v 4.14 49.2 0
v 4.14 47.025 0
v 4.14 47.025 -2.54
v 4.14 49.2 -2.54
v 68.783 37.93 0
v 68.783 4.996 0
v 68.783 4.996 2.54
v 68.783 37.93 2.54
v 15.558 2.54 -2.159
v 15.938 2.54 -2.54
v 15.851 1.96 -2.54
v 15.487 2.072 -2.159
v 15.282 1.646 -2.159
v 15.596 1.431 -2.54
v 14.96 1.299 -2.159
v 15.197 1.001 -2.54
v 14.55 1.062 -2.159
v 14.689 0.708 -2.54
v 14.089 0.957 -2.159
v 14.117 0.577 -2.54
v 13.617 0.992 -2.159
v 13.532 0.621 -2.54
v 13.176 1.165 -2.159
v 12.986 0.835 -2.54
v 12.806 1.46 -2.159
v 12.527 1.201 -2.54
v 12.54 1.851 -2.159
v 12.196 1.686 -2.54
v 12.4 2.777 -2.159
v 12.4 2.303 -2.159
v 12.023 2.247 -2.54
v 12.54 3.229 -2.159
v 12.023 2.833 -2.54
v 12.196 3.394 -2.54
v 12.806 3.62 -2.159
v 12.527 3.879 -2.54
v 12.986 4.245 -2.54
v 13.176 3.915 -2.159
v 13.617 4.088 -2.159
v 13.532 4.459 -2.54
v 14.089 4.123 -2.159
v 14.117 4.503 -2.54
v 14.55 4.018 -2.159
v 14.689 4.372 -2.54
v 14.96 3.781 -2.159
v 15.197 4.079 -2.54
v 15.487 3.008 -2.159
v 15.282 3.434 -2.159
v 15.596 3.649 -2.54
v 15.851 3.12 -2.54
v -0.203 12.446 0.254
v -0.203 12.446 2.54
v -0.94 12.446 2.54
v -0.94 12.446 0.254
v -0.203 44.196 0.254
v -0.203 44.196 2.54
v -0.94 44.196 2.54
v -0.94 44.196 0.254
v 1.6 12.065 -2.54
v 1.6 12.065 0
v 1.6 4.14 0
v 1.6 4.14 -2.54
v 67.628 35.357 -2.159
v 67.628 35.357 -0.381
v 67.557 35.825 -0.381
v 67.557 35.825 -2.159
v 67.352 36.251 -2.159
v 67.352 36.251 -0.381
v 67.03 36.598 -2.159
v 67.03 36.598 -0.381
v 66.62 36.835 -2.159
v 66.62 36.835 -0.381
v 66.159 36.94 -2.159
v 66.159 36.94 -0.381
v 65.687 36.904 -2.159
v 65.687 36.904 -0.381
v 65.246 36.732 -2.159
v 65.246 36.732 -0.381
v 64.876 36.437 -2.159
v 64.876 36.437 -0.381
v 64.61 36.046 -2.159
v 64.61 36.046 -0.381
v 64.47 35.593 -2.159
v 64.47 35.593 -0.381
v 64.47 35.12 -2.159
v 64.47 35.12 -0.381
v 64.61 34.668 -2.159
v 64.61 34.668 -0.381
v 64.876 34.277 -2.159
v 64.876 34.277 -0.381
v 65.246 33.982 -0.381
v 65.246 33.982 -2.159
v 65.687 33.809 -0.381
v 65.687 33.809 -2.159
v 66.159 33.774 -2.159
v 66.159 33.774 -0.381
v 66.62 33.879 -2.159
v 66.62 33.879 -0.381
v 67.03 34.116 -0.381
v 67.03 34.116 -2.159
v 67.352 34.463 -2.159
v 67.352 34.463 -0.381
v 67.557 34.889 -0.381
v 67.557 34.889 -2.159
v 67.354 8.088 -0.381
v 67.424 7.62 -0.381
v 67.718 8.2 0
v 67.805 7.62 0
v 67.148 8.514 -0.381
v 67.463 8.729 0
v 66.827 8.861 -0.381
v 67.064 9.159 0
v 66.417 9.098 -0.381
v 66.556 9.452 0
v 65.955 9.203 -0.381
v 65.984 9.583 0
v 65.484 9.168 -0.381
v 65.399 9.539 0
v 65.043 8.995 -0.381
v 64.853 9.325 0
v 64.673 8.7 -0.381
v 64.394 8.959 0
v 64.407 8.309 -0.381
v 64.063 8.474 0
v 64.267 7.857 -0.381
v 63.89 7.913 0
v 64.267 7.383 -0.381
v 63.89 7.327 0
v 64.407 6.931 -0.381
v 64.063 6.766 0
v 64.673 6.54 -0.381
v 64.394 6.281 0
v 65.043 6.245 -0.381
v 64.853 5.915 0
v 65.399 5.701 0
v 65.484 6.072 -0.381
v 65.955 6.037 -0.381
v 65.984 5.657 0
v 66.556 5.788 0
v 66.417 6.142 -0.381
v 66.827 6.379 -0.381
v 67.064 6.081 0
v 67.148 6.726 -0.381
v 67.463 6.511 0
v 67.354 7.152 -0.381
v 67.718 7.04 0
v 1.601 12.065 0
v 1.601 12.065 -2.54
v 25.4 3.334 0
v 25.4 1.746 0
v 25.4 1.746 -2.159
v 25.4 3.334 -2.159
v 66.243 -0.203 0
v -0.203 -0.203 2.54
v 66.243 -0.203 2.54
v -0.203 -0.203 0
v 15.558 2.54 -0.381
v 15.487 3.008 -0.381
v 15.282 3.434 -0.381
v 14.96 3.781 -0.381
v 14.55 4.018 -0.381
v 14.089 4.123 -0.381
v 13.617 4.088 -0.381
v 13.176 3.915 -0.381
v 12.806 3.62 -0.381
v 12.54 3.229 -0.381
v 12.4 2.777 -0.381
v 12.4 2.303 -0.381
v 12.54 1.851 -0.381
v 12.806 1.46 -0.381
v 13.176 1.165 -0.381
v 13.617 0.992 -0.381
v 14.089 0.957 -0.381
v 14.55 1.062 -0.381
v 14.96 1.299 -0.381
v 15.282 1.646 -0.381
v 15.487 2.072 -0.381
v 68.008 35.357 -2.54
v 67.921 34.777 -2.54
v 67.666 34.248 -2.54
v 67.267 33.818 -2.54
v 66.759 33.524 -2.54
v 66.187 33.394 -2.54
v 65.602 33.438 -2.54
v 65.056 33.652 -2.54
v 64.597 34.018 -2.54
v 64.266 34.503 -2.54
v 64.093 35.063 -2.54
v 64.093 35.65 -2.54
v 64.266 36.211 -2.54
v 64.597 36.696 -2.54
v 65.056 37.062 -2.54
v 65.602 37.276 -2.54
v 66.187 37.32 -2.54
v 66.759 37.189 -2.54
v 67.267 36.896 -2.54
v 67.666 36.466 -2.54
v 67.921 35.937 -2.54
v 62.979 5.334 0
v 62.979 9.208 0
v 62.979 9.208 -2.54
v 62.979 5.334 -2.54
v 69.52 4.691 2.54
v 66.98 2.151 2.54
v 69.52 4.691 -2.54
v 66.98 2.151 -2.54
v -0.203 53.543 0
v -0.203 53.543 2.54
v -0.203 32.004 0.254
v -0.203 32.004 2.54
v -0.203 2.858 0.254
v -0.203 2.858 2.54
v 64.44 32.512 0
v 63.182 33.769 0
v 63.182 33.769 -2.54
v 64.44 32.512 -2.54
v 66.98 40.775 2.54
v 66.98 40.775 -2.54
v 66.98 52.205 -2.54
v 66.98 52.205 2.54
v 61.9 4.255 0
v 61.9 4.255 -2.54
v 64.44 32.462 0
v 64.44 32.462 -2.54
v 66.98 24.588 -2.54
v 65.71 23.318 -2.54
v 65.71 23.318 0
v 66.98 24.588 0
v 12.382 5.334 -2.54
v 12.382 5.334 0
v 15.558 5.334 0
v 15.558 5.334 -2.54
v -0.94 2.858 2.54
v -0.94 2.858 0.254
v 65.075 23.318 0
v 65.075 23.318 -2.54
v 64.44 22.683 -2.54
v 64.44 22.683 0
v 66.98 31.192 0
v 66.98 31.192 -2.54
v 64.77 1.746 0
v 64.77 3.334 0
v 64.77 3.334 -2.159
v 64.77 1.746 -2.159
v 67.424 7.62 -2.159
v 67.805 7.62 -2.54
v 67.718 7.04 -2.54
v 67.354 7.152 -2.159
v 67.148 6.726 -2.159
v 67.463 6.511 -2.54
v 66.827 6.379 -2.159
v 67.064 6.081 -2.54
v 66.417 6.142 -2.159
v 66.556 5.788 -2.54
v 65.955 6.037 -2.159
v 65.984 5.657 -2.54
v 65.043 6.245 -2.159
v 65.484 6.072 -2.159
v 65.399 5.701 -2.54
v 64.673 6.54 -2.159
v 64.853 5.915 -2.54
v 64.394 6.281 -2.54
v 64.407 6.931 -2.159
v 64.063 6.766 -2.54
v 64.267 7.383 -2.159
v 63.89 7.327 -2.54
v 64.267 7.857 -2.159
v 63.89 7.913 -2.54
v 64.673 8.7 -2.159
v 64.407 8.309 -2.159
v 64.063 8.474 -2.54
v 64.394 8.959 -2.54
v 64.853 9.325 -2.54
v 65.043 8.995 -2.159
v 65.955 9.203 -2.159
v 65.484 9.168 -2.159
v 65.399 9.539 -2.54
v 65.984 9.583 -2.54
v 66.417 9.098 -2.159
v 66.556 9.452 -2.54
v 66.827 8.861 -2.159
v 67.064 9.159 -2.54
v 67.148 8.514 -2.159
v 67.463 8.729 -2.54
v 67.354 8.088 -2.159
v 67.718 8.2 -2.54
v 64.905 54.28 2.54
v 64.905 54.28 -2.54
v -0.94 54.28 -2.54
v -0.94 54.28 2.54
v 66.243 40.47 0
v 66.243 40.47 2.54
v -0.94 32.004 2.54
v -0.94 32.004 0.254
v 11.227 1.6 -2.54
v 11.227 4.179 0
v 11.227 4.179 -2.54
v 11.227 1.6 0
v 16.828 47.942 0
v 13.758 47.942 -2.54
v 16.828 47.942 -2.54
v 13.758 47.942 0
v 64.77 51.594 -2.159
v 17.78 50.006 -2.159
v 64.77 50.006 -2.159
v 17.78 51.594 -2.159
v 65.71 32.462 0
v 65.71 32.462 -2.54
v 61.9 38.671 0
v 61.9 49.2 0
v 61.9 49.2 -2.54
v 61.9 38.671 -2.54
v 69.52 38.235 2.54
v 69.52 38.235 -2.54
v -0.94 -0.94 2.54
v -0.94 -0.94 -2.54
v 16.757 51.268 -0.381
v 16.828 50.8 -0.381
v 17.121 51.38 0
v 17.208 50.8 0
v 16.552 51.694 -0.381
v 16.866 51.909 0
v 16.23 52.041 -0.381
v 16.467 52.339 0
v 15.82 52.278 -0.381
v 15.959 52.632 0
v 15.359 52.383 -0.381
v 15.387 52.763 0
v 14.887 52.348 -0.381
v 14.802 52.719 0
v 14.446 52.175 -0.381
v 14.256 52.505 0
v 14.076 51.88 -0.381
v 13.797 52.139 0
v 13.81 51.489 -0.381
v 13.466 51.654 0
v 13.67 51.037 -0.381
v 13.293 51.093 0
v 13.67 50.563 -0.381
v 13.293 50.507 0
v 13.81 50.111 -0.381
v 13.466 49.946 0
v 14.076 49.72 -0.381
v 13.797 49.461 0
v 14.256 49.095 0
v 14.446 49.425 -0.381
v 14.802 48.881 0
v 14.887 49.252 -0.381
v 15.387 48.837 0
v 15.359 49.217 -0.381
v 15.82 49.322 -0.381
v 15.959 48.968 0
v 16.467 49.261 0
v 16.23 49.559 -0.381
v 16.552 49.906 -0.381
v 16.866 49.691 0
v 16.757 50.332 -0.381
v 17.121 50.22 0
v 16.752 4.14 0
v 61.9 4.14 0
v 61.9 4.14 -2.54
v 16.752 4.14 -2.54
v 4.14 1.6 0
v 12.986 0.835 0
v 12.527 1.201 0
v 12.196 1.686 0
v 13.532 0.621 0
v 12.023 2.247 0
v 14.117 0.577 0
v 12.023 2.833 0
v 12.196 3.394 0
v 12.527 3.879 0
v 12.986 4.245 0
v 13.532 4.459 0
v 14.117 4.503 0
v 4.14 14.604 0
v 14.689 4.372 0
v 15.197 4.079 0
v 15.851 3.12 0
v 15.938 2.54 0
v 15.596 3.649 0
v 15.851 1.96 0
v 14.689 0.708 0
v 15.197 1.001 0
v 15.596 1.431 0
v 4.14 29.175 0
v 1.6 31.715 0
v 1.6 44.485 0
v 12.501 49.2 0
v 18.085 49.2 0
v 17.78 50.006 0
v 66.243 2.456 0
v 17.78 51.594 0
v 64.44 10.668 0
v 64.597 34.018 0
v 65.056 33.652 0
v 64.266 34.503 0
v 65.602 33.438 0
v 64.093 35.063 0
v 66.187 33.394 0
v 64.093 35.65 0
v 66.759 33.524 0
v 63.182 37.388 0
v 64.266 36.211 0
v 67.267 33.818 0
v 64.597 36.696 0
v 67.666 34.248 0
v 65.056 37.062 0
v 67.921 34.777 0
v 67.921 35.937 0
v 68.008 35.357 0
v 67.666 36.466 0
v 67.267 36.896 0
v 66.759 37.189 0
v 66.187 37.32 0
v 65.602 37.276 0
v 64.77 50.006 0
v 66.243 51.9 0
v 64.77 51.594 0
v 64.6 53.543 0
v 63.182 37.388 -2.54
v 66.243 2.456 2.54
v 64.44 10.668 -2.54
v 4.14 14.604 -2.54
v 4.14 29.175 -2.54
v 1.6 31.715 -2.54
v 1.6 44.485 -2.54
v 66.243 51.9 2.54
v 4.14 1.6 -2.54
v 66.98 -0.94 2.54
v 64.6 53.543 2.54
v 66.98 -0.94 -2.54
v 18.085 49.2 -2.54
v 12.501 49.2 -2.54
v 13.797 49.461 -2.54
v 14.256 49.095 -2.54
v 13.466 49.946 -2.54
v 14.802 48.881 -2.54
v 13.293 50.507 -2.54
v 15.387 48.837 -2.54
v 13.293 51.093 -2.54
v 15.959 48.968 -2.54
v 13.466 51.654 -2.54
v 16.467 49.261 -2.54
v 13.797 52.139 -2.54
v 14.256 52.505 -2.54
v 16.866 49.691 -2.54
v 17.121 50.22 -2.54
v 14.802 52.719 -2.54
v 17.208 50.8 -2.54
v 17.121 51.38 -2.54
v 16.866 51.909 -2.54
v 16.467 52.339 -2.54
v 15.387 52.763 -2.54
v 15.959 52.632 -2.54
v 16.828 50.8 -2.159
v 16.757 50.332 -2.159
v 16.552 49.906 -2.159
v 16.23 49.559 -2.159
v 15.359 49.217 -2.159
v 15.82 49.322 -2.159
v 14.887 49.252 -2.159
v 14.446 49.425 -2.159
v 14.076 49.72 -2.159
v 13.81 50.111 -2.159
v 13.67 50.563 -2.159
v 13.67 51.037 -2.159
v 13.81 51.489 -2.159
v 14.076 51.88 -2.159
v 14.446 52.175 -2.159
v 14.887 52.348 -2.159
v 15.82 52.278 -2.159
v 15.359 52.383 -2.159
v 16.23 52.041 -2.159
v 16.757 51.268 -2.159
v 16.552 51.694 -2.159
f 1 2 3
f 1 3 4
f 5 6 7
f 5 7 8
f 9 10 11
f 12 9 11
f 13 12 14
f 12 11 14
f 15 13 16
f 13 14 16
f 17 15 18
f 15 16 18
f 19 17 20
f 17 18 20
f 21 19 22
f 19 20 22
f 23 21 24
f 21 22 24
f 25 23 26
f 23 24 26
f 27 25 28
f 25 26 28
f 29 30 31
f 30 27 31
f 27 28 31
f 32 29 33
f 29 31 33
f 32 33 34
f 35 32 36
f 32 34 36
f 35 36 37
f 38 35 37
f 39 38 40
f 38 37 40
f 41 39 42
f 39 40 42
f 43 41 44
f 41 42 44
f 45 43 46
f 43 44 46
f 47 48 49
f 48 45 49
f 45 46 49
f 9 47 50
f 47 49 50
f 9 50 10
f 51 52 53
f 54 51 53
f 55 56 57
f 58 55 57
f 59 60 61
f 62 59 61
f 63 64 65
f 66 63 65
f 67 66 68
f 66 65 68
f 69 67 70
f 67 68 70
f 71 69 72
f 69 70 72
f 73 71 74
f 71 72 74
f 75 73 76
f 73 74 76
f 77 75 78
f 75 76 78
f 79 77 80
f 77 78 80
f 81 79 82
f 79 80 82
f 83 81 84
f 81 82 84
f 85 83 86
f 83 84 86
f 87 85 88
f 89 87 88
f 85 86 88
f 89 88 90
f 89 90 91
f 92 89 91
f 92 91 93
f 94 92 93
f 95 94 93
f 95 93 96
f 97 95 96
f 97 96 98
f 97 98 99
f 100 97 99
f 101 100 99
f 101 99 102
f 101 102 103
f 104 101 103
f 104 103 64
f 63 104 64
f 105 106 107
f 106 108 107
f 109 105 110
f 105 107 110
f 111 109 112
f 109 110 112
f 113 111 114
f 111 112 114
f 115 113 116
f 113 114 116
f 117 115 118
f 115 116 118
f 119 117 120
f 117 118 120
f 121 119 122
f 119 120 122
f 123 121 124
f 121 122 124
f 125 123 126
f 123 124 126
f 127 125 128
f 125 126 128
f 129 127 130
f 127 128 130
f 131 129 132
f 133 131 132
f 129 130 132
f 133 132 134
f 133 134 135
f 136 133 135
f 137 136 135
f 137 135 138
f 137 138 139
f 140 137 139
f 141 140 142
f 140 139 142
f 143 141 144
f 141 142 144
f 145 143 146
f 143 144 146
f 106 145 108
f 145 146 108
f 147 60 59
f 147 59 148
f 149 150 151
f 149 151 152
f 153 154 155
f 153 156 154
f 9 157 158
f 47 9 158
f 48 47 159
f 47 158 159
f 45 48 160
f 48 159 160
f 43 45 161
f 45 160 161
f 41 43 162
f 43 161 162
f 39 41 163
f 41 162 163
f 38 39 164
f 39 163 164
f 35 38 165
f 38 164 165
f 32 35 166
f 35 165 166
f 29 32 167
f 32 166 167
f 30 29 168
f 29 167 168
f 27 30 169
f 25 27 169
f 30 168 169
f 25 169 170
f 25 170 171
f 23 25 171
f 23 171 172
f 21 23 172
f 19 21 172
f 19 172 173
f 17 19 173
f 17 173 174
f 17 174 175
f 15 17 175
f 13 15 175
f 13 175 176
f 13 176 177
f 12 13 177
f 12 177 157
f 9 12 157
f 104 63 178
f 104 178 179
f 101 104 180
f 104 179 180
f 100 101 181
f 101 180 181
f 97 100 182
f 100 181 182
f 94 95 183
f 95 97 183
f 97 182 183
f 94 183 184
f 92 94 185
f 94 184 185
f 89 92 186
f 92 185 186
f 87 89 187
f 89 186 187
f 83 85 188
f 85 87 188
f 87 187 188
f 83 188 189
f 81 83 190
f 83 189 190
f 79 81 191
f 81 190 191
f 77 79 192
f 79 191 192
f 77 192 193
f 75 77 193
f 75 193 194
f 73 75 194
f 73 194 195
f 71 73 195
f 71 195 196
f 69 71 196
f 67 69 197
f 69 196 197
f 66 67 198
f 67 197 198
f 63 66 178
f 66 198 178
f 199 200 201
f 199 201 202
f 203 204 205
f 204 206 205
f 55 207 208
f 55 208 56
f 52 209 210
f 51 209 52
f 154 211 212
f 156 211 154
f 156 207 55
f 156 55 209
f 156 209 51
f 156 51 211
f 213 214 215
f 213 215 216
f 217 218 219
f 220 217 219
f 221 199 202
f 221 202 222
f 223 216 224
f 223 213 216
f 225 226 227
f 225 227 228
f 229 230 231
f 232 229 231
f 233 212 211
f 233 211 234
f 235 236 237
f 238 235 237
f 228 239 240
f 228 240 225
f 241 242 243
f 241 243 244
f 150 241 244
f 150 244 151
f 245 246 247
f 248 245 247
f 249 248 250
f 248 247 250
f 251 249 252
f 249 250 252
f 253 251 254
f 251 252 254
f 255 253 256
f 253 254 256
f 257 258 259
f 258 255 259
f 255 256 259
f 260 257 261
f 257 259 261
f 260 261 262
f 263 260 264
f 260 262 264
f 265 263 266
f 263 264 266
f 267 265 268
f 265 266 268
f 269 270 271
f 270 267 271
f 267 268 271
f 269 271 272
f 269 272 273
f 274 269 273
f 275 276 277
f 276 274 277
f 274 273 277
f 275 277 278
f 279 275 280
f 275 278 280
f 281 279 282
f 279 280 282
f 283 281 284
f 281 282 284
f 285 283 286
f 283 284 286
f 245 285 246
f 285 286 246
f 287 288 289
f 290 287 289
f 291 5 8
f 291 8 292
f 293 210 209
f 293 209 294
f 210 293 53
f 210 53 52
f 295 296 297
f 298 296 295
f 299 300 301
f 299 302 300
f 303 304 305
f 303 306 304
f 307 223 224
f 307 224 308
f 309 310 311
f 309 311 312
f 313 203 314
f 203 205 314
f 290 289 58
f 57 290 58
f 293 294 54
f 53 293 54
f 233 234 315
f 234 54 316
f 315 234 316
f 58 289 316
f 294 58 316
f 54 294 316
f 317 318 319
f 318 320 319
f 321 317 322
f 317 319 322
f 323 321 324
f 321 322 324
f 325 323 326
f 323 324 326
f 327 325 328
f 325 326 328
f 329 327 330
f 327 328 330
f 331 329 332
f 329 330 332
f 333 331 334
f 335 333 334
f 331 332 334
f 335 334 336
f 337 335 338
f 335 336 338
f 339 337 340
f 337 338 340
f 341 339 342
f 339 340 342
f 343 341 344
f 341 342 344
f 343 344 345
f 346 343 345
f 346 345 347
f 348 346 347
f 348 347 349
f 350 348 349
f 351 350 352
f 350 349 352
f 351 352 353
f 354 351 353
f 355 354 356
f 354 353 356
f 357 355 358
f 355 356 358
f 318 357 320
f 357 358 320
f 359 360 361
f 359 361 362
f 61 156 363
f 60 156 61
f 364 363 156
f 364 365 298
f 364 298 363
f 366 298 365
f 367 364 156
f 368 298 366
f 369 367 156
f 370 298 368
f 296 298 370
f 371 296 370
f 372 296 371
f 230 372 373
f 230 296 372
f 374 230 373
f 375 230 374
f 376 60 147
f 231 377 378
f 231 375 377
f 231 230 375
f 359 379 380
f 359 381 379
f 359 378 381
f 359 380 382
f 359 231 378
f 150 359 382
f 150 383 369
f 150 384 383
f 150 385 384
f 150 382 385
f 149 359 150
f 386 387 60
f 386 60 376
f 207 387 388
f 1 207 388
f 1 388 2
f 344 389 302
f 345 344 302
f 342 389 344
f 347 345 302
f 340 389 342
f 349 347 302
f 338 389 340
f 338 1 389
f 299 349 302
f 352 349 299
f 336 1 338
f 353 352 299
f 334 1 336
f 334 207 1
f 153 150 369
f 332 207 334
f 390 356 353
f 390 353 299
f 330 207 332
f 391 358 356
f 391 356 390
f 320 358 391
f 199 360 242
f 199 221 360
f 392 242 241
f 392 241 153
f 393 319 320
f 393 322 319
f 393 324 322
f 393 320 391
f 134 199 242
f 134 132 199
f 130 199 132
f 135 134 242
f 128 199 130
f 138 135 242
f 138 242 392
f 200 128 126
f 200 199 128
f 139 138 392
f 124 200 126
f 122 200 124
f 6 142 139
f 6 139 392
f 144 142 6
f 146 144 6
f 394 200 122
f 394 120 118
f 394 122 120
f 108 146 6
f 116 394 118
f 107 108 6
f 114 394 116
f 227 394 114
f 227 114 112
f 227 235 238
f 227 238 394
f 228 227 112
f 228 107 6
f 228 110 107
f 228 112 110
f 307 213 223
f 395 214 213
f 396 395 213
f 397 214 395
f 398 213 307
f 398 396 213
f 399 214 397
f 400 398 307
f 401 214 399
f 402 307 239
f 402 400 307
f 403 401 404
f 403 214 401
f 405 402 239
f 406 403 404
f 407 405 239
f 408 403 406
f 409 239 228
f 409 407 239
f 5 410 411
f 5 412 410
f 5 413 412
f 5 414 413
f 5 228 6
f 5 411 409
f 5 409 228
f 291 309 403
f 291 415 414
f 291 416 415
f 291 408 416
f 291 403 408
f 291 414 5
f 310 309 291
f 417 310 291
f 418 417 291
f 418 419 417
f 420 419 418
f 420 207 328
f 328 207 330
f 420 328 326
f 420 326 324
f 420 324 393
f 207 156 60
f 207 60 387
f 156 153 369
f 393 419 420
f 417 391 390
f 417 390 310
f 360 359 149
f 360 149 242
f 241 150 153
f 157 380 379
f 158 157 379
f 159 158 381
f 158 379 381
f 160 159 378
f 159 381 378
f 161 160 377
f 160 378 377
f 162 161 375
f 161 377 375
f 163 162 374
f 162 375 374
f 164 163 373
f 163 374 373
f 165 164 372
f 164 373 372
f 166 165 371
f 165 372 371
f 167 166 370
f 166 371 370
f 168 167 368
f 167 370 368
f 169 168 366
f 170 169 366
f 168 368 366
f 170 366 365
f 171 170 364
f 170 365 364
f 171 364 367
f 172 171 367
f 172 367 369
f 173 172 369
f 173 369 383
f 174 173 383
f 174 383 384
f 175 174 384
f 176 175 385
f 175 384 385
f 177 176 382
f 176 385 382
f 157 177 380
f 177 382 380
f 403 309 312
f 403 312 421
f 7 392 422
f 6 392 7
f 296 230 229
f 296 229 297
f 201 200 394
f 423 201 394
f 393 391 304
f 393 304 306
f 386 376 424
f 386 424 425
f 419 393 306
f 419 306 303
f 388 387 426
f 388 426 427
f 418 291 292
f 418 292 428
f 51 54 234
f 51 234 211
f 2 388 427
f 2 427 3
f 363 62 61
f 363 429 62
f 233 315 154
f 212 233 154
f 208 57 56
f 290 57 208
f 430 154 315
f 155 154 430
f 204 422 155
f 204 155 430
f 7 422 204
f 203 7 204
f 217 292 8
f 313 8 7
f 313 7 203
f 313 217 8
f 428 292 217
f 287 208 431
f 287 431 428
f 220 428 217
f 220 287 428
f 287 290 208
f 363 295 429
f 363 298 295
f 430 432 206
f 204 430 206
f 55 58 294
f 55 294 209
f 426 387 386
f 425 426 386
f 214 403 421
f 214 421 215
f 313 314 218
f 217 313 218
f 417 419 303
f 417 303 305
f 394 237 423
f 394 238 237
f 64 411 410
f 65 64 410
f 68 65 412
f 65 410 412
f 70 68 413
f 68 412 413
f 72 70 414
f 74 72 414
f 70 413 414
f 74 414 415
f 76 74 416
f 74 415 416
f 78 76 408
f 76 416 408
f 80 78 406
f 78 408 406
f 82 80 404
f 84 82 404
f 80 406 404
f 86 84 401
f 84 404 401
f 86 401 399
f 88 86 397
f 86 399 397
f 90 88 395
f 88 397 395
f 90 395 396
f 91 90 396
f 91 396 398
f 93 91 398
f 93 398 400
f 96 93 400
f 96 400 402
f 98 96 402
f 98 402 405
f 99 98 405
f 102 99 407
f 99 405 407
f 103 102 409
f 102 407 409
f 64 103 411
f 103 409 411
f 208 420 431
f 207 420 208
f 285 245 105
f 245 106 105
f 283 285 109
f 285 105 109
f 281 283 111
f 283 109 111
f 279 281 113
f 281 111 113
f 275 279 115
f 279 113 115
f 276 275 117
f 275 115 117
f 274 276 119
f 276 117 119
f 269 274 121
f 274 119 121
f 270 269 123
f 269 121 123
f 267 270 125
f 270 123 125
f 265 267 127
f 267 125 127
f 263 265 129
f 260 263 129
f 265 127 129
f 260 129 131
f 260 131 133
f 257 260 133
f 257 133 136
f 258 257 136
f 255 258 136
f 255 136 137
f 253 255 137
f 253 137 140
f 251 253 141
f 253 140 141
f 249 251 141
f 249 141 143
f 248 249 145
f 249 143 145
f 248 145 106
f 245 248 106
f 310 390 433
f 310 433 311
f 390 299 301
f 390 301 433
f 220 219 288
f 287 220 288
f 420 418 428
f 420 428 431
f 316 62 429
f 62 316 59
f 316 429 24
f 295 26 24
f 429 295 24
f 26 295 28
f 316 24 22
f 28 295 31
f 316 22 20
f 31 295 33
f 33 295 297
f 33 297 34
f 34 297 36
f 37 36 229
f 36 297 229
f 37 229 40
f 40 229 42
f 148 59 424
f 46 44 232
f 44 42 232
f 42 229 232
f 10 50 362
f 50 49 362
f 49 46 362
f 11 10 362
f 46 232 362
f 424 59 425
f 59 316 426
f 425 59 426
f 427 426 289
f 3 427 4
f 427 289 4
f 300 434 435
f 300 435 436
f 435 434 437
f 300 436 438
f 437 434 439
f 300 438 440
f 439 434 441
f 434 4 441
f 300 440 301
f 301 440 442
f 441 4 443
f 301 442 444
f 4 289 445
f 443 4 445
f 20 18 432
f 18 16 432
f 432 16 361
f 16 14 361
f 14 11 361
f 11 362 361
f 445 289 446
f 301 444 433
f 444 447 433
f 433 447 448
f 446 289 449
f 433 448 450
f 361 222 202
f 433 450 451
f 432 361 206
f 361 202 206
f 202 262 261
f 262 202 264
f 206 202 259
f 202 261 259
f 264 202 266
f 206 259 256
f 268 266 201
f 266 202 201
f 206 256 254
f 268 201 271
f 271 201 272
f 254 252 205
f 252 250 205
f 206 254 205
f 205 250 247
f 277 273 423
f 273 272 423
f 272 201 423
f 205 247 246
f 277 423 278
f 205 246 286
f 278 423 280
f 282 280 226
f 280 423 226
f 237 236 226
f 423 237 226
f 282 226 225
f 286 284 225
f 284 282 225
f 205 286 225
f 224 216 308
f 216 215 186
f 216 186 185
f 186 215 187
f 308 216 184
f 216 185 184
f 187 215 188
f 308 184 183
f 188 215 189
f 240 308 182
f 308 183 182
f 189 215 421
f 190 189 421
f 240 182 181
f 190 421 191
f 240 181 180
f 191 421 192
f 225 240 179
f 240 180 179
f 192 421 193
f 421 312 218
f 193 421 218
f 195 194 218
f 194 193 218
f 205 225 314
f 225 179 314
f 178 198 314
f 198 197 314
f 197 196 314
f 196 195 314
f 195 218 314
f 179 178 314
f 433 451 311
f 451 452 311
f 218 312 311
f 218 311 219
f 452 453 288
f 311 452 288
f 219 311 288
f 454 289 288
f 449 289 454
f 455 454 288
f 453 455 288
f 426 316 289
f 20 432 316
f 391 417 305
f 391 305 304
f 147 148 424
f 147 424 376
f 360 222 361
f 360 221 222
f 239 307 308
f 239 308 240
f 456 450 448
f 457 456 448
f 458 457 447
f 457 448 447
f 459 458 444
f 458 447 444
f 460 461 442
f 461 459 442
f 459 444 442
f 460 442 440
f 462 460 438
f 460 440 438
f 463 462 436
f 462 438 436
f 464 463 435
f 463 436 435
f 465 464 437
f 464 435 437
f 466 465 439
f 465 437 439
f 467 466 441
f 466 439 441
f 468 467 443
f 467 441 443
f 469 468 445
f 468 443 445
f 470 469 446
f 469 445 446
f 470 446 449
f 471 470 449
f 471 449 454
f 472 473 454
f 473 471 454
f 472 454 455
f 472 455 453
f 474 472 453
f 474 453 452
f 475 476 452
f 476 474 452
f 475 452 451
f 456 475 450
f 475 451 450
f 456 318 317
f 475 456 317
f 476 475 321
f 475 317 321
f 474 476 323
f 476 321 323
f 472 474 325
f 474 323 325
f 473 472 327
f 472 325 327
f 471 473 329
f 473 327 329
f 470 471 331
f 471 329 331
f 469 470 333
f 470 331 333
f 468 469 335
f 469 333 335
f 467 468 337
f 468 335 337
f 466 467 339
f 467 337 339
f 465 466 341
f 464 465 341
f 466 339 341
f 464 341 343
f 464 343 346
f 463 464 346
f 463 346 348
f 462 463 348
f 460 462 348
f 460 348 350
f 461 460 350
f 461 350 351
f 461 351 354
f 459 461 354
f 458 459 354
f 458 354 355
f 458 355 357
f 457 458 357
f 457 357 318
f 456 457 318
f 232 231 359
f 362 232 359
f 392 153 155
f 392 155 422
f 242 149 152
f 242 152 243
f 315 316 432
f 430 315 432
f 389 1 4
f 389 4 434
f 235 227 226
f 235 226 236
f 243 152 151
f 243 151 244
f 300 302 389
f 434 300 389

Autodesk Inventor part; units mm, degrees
ref_plane "YZ Plane" through (0, 0, 0) normal (1, 0, 0) x (0, 1, 0)
ref_plane "XZ Plane" through (0, 0, 0) normal (0, 1, 0) x (-1, 0, 0)
ref_plane "XY Plane" through (0, 0, 0) normal (0, 0, 1) x (1, 0, 0)
sketch "Sketch1" plane through (0, 0, 0) normal (0, 0, 1) x (1, 0, 0)
  line L0 (0, 53.34) -> (64.516, 53.34)
  line L1 (64.516, 53.34) -> (66.04, 51.816)
  line L2 (66.04, 51.816) -> (66.04, 40.386)
  line L3 (66.04, 40.386) -> (68.58, 37.846)
  line L4 (68.58, 37.846) -> (68.58, 5.08)
  line L5 (66.04, 0) -> (0, 0)
  line L6 (0, 0) -> (0, 53.34)
  line L7 (68.58, 5.08) -> (66.04, 2.54)
  line L8 (66.04, 2.54) -> (66.04, 0)
  line L9 (64.9053, 54.2798) -> (-0.9398, 54.2798)
  line L10 (-0.9398, 54.2798) -> (-0.9398, -0.9398)
  line L11 (-0.9398, -0.9398) -> (66.9798, -0.9398)
  line L12 (66.9798, -0.9398) -> (66.9798, 2.1507)
  line L13 (66.9798, 2.1507) -> (69.5198, 4.6907)
  line L14 (69.5198, 4.6907) -> (69.5198, 38.2353)
  line L15 (69.5198, 38.2353) -> (66.9798, 40.7753)
  line L16 (66.9798, 40.7753) -> (66.9798, 52.2053)
  line L17 (66.9798, 52.2053) -> (64.9053, 54.2798)
  line L18 (64.6002, 53.5432) -> (-0.2032, 53.5432)
  line L19 (-0.2032, 53.5432) -> (-0.2032, -0.2032)
  line L20 (-0.2032, -0.2032) -> (66.2432, -0.2032)
  line L21 (66.2432, -0.2032) -> (66.2432, 2.4558)
  line L22 (66.2432, 2.4558) -> (68.7832, 4.9958)
  line L23 (68.7832, 4.9958) -> (68.7832, 37.9302)
  line L24 (68.7832, 37.9302) -> (66.2432, 40.4702)
  line L25 (66.2432, 40.4702) -> (66.2432, 51.9002)
  line L26 (66.2432, 51.9002) -> (64.6002, 53.5432)
  point P0 (0, 0)
  dimension "d0" = 64.516
  dimension "d1" = 53.34
  dimension "d4" = 66.04
  dimension "d5" = 51.816
  dimension "d6" = 68.58
  dimension "d7" = 40.386
  dimension "d8" = 37.846
  dimension "d9" = 66.04
  dimension "d10" = 2.54
  dimension "d11" = 5.08
  dimension "d15" = 0.2032
  dimension "d18" = 0.7366
extrude "Extrusion2" add sketch "Sketch1" along normal blind 2.54 contours L17 L16 L15 L14 L13 L12 L11 L10 L9
sketch "Sketch2" plane through (0, 0, 0) normal (0, 0, 1) x (1, 0, 0)
  line L0 (0, 53.34) -> (64.516, 53.34)
  line L1 (64.516, 53.34) -> (66.04, 51.816)
  line L2 (66.04, 51.816) -> (66.04, 40.386)
  line L3 (66.04, 40.386) -> (68.58, 37.846)
  line L4 (68.58, 37.846) -> (68.58, 5.08)
  line L5 (66.04, 0) -> (0, 0)
  line L6 (0, 0) -> (0, 53.34)
  line L7 (68.58, 5.08) -> (66.04, 2.54)
  line L8 (66.04, 2.54) -> (66.04, 0)
  line L9 (64.9053, 54.2798) -> (-0.9398, 54.2798)
  line L10 (-0.9398, 54.2798) -> (-0.9398, -0.9398)
  line L11 (-0.9398, -0.9398) -> (66.9798, -0.9398)
  line L12 (66.9798, -0.9398) -> (66.9798, 2.1507)
  line L13 (66.9798, 2.1507) -> (69.5198, 4.6907)
  line L14 (69.5198, 4.6907) -> (69.5198, 38.2353)
  line L15 (69.5198, 38.2353) -> (66.9798, 40.7753)
  line L16 (66.9798, 40.7753) -> (66.9798, 52.2053)
  line L17 (66.9798, 52.2053) -> (64.9053, 54.2798)
  line L18 (64.6002, 53.5432) -> (-0.2032, 53.5432)
  line L19 (-0.2032, 53.5432) -> (-0.2032, -0.2032)
  line L20 (-0.2032, -0.2032) -> (66.2432, -0.2032)
  line L21 (66.2432, -0.2032) -> (66.2432, 2.4558)
  line L22 (66.2432, 2.4558) -> (68.7832, 4.9958)
  line L23 (68.7832, 4.9958) -> (68.7832, 37.9302)
  line L24 (68.7832, 37.9302) -> (66.2432, 40.4702)
  line L25 (66.2432, 40.4702) -> (66.2432, 51.9002)
  line L26 (66.2432, 51.9002) -> (64.6002, 53.5432)
  line L27 (61.8998, 49.1998) -> (61.8998, 38.6711)
  line L28 (61.8998, 38.6711) -> (63.1825, 37.3884)
  line L29 (62.9793, 5.3344) -> (61.8998, 4.2549)
  line L30 (61.8998, 4.2549) -> (61.8998, 4.1402)
  line L31 (4.1402, 4.1402) -> (4.1402, 49.1998)
  line L32 (63.627, 30.43) -> (66.167, 30.43) construction
  line L33 (66.167, 30.43) -> (66.167, 25.35) construction
  line L34 (66.167, 25.35) -> (63.627, 25.35) construction
  line L35 (63.627, 25.35) -> (63.627, 30.43) construction
  circle A0 centre (15.24, 50.8) radius 1.5875
  circle A1 centre (66.04, 35.3568) radius 1.5875
  circle A2 centre (65.8368, 7.62) radius 1.5875
  circle A3 centre (13.97, 2.54) radius 1.5875
  line L36 (13.7585, 47.9425) -> (16.8275, 47.9425)
  line L37 (16.8275, 47.9425) -> (18.0848, 49.1998)
  line L38 (13.7585, 47.9425) -> (12.5012, 49.1998)
  line L39 (4.1402, 49.1998) -> (12.5012, 49.1998)
  line L40 (18.0848, 49.1998) -> (61.8998, 49.1998)
  line L41 (63.1825, 37.3884) -> (63.1825, 33.7693)
  line L42 (63.1825, 33.7693) -> (64.4398, 32.512)
  line L43 (62.9793, 9.2075) -> (62.9793, 5.3344)
  line L44 (62.9793, 9.2075) -> (64.4398, 10.668)
  line L45 (64.4398, 32.512) -> (64.4398, 10.668)
  line L46 (12.3825, 5.3344) -> (15.5575, 5.3344)
  line L47 (15.5575, 5.3344) -> (16.7517, 4.1402)
  line L48 (12.3825, 5.3344) -> (11.1883, 4.1402)
  line L49 (61.8998, 4.1402) -> (16.7517, 4.1402)
  line L50 (11.1883, 4.1402) -> (4.1402, 4.1402)
  point P0 (0, 0)
  point P1 (0, 1.4137)
  point P2 (64.4398, 6.7949)
  dimension "d19" = 64.516
  dimension "d20" = 53.34
  dimension "d21" = 66.04
  dimension "d22" = 51.816
  dimension "d23" = 68.58
  dimension "d24" = 40.386
  dimension "d25" = 37.846
  dimension "d26" = 66.04
  dimension "d27" = 2.54
  dimension "d28" = 5.08
  dimension "d29" = 0.2032
  dimension "d30" = 0.7366
  dimension "d56" = 30.43
  dimension "d57" = 63.627
  dimension "d58" = 5.08
  dimension "d61" = 2.54
  dimension "d70" = 13.97
  dimension "d71" = 2.54
  dimension "d72" = 3.175
  dimension "d73" = 50.8
  dimension "d74" = 3.175
  dimension "d75" = 15.24
  dimension "d76" = 66.04
  dimension "d77" = 35.56
  dimension "d78" = 3.175
  dimension "d79" = 3.175
  dimension "d80" = 66.04
  dimension "d81" = 7.62
  dimension "d135" = 2.54
  dimension "d136" = 1.27
  dimension "d137" = 2.8575
  dimension "d138" = 1.27
extrude "Extrusion3" add sketch "Sketch2" against normal blind 2.54 contours L0 L1 L2 L3 L4 L7 L8 L5 L6 | L17 L16 L15 L14 L13 L12 L11 L10 L9 | L26 L25 L24 L23 L22 L21 L20 L19 L18
sketch "Sketch4" plane through (0, 0, 2.54) normal (0, 0, 1) x (1, 0, 0)
  line L0 (-0.2032, -0.2032) -> (-0.2032, 53.5432) projected
  line L1 (-0.9398, -0.9398) -> (-0.9398, 54.2798) projected
  line L2 (-0.2032, 12.446) -> (-0.9398, 12.446)
  line L3 (-0.2032, 2.8575) -> (-0.9398, 2.8575)
  line L4 (-0.2032, 32.004) -> (-0.9398, 32.004)
  line L5 (-0.2032, 44.196) -> (-0.9398, 44.196)
  point P0 (0, 0)
  dimension "d35" = 12.446
  dimension "d36" = 2.8575
  dimension "d37" = 32.004
  dimension "d38" = 44.196
extrude "Extrusion4" cut sketch "Sketch4" against normal blind 2.286 contours L3 L1 L2 L0 | L4 L1 L5 L0
sketch "Sketch5" plane through (0, 0, 0) normal (0, 0, 1) x (1, 0, 0)
  line L0 (25.4, 3.3338) -> (64.77, 3.3338)
  line L1 (64.77, 3.3338) -> (64.77, 1.7463)
  line L2 (64.77, 1.7463) -> (25.4, 1.7463)
  line L3 (25.4, 1.7463) -> (25.4, 3.3338)
  line L4 (17.78, 51.5938) -> (64.77, 51.5938)
  line L5 (64.77, 51.5938) -> (64.77, 50.0062)
  line L6 (64.77, 50.0062) -> (17.78, 50.0062)
  line L7 (17.78, 50.0062) -> (17.78, 51.5938)
  line L8 (-0.2032, 53.5432) -> (-0.2032, -0.2032) projected
  line L9 (-0.2032, 12.065) -> (11.2268, 12.065)
  line L10 (11.2268, 12.065) -> (11.2268, 1.6002)
  line L11 (11.2268, 1.6002) -> (-0.2032, 1.6002)
  line L12 (-0.2032, 1.6002) -> (-0.2032, 12.065)
  line L13 (1.6002, 12.065) -> (1.6002, 1.6002)
  line L14 (63.627, 30.43) -> (66.167, 30.43) construction
  line L15 (63.627, 25.35) -> (63.627, 30.43) construction
  line L16 (66.167, 30.43) -> (66.167, 25.35) construction
  line L17 (66.167, 25.35) -> (63.627, 25.35) construction
  line L18 (4.1402, 4.1402) -> (4.1402, 49.1998) projected
  line L19 (4.1402, 49.1998) -> (12.5012, 49.1998) projected
  line L20 (61.8998, 49.1998) -> (61.8998, 38.6711) projected
  line L21 (61.8998, 38.6711) -> (63.1825, 37.3884) projected
  line L22 (64.4398, 32.512) -> (64.4398, 10.668) projected
  line L23 (62.9793, 5.3344) -> (61.8998, 4.2549) projected
  line L24 (61.8998, 4.2549) -> (61.8998, 4.1402) projected
  line L25 (61.8998, 4.1402) -> (16.7517, 4.1402) projected
  line L26 (66.2432, 51.9002) -> (64.6002, 53.5432) projected
  line L27 (64.6002, 53.5432) -> (-0.2032, 53.5432) projected
  line L28 (-0.2032, 53.5432) -> (-0.2032, -0.2032) projected
  line L29 (-0.2032, -0.2032) -> (66.2432, -0.2032) projected
  line L30 (66.2432, -0.2032) -> (66.2432, 2.4558) projected
  line L31 (66.2432, 2.4558) -> (68.7832, 4.9958) projected
  line L32 (68.7832, 4.9958) -> (68.7832, 37.9302) projected
  line L33 (68.7832, 37.9302) -> (66.2432, 40.4702) projected
  line L34 (66.2432, 40.4702) -> (66.2432, 51.9002) projected
  line L35 (64.4398, 32.512) -> (64.4398, 10.668) projected
  line L36 (64.4398, 33.732) -> (66.9798, 31.192)
  line L37 (64.4398, 22.048) -> (66.9798, 24.588)
  line L38 (66.9798, 31.192) -> (66.9798, 24.588)
  line L39 (64.4398, 33.732) -> (64.4398, 22.048)
  line L40 (61.8998, 4.1402) -> (16.7517, 4.1402) projected
  line L41 (4.1402, 4.1402) -> (4.1402, 49.1998) projected
  line L42 (1.6002, 44.4853) -> (4.1402, 47.0253)
  line L43 (66.2432, 40.4702) -> (66.2432, 51.9002) projected
  line L44 (1.6002, 31.7147) -> (4.1402, 29.1747)
  line L45 (1.6002, 31.7147) -> (1.6002, 44.4853)
  line L46 (4.1402, 47.0253) -> (4.1402, 29.1747)
  line L47 (12.5012, 49.1998) -> (13.7585, 47.9425) projected
  line L48 (13.7585, 47.9425) -> (16.8275, 47.9425) projected
  line L49 (16.8275, 47.9425) -> (18.0848, 49.1998) projected
  line L50 (18.0848, 49.1998) -> (61.8998, 49.1998) projected
  line L51 (63.1825, 37.3884) -> (63.1825, 33.7693) projected
  line L52 (63.1825, 33.7693) -> (64.4398, 32.512) projected
  line L53 (64.4398, 10.668) -> (62.9793, 9.2075) projected
  line L54 (62.9793, 9.2075) -> (62.9793, 5.3344) projected
  line L55 (11.1883, 4.1402) -> (4.1402, 4.1402) projected
  line L56 (16.7517, 4.1402) -> (15.5575, 5.3344) projected
  line L57 (15.5575, 5.3344) -> (12.3825, 5.3344) projected
  line L58 (12.3825, 5.3344) -> (11.1883, 4.1402) projected
  point P0 (0, 0)
  point P1 (64.4398, 6.7949)
  point P2 (64.4398, 36.1311)
  point P3 (64.4398, 31.192)
  point P4 (64.4398, 31.192)
  point P5 (64.4398, 24.588)
  point P6 (64.4398, 24.588)
  dimension "d41" = 1.5875
  dimension "d42" = 25.4
  dimension "d43" = 64.77
  dimension "d44" = 17.78
  dimension "d45" = 64.77
  dimension "d46" = 1.5875
  dimension "d47" = 51.5938
  dimension "d48" = 1.7463
  dimension "d51" = 0
  dimension "d52" = 12.065
  dimension "d54" = 11.43
  dimension "d66" = 2.54
  dimension "d67" = 2.54
  dimension "d68" = 2.54
  dimension "d69" = 2.54
  dimension "d97" = 2.54
  dimension "d101" = 2.54
  dimension "d102" = 2.54
extrude "Extrusion5" cut sketch "Sketch5" against normal blind 2.159 contours L0 L1 L2 L3 | L4 L5 L6 L7
sketch "Sketch7" plane through (0, 0, 0) normal (0, 0, 1) x (1, 0, 0)
  line L0 (25.4, 3.3338) -> (64.77, 3.3338)
  line L1 (64.77, 3.3338) -> (64.77, 1.7463)
  line L2 (64.77, 1.7463) -> (25.4, 1.7463)
  line L3 (25.4, 1.7463) -> (25.4, 3.3338)
  line L4 (17.78, 51.5938) -> (64.77, 51.5938)
  line L5 (64.77, 51.5938) -> (64.77, 50.0062)
  line L6 (64.77, 50.0062) -> (17.78, 50.0062)
  line L7 (17.78, 50.0062) -> (17.78, 51.5938)
  line L8 (-0.2032, 53.5432) -> (-0.2032, -0.2032)
  line L9 (-0.2032, 12.065) -> (11.2268, 12.065)
  line L10 (11.2268, 12.065) -> (11.2268, 1.6002)
  line L11 (11.2268, 1.6002) -> (-0.2032, 1.6002)
  line L12 (-0.2032, 1.6002) -> (-0.2032, 12.065)
  line L13 (1.6002, 12.065) -> (1.6002, 1.6002)
  line L14 (63.627, 30.43) -> (66.167, 30.43) construction
  line L15 (63.627, 25.35) -> (63.627, 30.43) construction
  line L16 (66.167, 30.43) -> (66.167, 25.35) construction
  line L17 (66.167, 25.35) -> (63.627, 25.35) construction
  line L18 (4.1402, 4.1402) -> (4.1402, 49.1998)
  line L19 (4.1402, 49.1998) -> (61.8998, 49.1998)
  line L20 (61.8998, 49.1998) -> (61.8998, 38.6711)
  line L21 (61.8998, 38.6711) -> (64.4398, 36.1311)
  line L22 (64.4398, 6.866) -> (64.4398, 6.7949)
  line L23 (64.4398, 6.7949) -> (61.8998, 4.2549)
  line L24 (61.8998, 4.2549) -> (61.8998, 4.1402)
  line L25 (61.8998, 4.1402) -> (4.1402, 4.1402)
  line L26 (66.2432, 51.9002) -> (64.6002, 53.5432)
  line L27 (64.6002, 53.5432) -> (-0.2032, 53.5432)
  line L28 (-0.2032, 53.5432) -> (-0.2032, -0.2032)
  line L29 (-0.2032, -0.2032) -> (66.2432, -0.2032)
  line L30 (66.2432, -0.2032) -> (66.2432, 2.4558)
  line L31 (66.2432, 2.4558) -> (68.7832, 4.9958)
  line L32 (68.7832, 4.9958) -> (68.7832, 37.9302)
  line L33 (68.7832, 37.9302) -> (66.2432, 40.4702)
  line L34 (66.2432, 40.4702) -> (66.2432, 51.9002)
  line L35 (64.4398, 36.1311) -> (64.4398, 6.7949)
  line L36 (65.7098, 32.462) -> (66.9798, 31.192)
  line L37 (65.7098, 23.318) -> (66.9798, 24.588)
  line L38 (66.9798, 31.192) -> (66.9798, 24.588)
  line L39 (64.4398, 33.732) -> (64.4398, 22.048)
  line L40 (61.8998, 4.1402) -> (4.1402, 4.1402)
  line L41 (4.1402, 4.1402) -> (4.1402, 49.1998)
  line L42 (1.6002, 44.4853) -> (4.1402, 47.0253)
  line L43 (66.2432, 40.4702) -> (66.2432, 51.9002)
  line L44 (1.6002, 31.7147) -> (4.1402, 29.1747)
  line L45 (1.6002, 31.7147) -> (1.6002, 44.4853)
  line L46 (4.1402, 47.0253) -> (4.1402, 29.1747)
  arc A0 (64.4398, 8.374) -> (64.4398, 6.866) centre (65.8368, 7.62) ccw
  line L47 (64.4398, 36.1311) -> (64.4398, 8.374)
  line L48 (64.4398, 32.462) -> (65.7098, 32.462)
  line L49 (65.7098, 23.318) -> (65.0748, 23.318)
  line L50 (65.0748, 23.318) -> (64.4398, 22.683)
  point P0 (0, 0)
  point P1 (0, 0)
  point P2 (64.4398, 31.192)
  point P3 (64.4398, 31.192)
  point P4 (64.4398, 24.588)
  point P5 (64.4398, 24.588)
  dimension "d106" = 1.5875
  dimension "d107" = 25.4
  dimension "d108" = 64.77
  dimension "d109" = 17.78
  dimension "d110" = 64.77
  dimension "d111" = 1.5875
  dimension "d112" = 51.5938
  dimension "d113" = 1.7463
  dimension "d114" = 0
  dimension "d115" = 12.065
  dimension "d116" = 11.43
  dimension "d117" = 2.54
  dimension "d118" = 2.54
  dimension "d119" = 2.54
  dimension "d120" = 2.54
  dimension "d121" = 2.54
  dimension "d122" = 2.54
  dimension "d123" = 2.54
extrude "Extrusion7" cut sketch "Sketch7" against normal through all contours L9 L18 L25 L10 L11 L13 | L9 L10 L25 L18 | L44 L45 L42 L18 | L48 L36 L38 L37 L49 L50 L35
chamfer "Chamfer3" distance 2.54 angle 45 1 edges at (4.1402, 12.065, -1.27)
chamfer "Chamfer5" distance 2.54 angle 45 1 edges at (1.6002, 1.6002, -1.27)
chamfer "Chamfer6" distance 0.381 angle 45 8 edges at (64.4525, 35.3568, 0) (64.2493, 7.62, 0) (12.3825, 2.54, 0) (13.6525, 50.8, 0) (13.6525, 50.8, -2.54) (12.3825, 2.54, -2.54) (64.2493, 7.62, -2.54) (64.4525, 35.3568, -2.54)
equation "\"d67\" = d66"
equation "\"d69\" = d68"
equation "\"d97\" = d101"
equation "\"d102\" = d101"
properties part number "Arduino Bumper 0006"
